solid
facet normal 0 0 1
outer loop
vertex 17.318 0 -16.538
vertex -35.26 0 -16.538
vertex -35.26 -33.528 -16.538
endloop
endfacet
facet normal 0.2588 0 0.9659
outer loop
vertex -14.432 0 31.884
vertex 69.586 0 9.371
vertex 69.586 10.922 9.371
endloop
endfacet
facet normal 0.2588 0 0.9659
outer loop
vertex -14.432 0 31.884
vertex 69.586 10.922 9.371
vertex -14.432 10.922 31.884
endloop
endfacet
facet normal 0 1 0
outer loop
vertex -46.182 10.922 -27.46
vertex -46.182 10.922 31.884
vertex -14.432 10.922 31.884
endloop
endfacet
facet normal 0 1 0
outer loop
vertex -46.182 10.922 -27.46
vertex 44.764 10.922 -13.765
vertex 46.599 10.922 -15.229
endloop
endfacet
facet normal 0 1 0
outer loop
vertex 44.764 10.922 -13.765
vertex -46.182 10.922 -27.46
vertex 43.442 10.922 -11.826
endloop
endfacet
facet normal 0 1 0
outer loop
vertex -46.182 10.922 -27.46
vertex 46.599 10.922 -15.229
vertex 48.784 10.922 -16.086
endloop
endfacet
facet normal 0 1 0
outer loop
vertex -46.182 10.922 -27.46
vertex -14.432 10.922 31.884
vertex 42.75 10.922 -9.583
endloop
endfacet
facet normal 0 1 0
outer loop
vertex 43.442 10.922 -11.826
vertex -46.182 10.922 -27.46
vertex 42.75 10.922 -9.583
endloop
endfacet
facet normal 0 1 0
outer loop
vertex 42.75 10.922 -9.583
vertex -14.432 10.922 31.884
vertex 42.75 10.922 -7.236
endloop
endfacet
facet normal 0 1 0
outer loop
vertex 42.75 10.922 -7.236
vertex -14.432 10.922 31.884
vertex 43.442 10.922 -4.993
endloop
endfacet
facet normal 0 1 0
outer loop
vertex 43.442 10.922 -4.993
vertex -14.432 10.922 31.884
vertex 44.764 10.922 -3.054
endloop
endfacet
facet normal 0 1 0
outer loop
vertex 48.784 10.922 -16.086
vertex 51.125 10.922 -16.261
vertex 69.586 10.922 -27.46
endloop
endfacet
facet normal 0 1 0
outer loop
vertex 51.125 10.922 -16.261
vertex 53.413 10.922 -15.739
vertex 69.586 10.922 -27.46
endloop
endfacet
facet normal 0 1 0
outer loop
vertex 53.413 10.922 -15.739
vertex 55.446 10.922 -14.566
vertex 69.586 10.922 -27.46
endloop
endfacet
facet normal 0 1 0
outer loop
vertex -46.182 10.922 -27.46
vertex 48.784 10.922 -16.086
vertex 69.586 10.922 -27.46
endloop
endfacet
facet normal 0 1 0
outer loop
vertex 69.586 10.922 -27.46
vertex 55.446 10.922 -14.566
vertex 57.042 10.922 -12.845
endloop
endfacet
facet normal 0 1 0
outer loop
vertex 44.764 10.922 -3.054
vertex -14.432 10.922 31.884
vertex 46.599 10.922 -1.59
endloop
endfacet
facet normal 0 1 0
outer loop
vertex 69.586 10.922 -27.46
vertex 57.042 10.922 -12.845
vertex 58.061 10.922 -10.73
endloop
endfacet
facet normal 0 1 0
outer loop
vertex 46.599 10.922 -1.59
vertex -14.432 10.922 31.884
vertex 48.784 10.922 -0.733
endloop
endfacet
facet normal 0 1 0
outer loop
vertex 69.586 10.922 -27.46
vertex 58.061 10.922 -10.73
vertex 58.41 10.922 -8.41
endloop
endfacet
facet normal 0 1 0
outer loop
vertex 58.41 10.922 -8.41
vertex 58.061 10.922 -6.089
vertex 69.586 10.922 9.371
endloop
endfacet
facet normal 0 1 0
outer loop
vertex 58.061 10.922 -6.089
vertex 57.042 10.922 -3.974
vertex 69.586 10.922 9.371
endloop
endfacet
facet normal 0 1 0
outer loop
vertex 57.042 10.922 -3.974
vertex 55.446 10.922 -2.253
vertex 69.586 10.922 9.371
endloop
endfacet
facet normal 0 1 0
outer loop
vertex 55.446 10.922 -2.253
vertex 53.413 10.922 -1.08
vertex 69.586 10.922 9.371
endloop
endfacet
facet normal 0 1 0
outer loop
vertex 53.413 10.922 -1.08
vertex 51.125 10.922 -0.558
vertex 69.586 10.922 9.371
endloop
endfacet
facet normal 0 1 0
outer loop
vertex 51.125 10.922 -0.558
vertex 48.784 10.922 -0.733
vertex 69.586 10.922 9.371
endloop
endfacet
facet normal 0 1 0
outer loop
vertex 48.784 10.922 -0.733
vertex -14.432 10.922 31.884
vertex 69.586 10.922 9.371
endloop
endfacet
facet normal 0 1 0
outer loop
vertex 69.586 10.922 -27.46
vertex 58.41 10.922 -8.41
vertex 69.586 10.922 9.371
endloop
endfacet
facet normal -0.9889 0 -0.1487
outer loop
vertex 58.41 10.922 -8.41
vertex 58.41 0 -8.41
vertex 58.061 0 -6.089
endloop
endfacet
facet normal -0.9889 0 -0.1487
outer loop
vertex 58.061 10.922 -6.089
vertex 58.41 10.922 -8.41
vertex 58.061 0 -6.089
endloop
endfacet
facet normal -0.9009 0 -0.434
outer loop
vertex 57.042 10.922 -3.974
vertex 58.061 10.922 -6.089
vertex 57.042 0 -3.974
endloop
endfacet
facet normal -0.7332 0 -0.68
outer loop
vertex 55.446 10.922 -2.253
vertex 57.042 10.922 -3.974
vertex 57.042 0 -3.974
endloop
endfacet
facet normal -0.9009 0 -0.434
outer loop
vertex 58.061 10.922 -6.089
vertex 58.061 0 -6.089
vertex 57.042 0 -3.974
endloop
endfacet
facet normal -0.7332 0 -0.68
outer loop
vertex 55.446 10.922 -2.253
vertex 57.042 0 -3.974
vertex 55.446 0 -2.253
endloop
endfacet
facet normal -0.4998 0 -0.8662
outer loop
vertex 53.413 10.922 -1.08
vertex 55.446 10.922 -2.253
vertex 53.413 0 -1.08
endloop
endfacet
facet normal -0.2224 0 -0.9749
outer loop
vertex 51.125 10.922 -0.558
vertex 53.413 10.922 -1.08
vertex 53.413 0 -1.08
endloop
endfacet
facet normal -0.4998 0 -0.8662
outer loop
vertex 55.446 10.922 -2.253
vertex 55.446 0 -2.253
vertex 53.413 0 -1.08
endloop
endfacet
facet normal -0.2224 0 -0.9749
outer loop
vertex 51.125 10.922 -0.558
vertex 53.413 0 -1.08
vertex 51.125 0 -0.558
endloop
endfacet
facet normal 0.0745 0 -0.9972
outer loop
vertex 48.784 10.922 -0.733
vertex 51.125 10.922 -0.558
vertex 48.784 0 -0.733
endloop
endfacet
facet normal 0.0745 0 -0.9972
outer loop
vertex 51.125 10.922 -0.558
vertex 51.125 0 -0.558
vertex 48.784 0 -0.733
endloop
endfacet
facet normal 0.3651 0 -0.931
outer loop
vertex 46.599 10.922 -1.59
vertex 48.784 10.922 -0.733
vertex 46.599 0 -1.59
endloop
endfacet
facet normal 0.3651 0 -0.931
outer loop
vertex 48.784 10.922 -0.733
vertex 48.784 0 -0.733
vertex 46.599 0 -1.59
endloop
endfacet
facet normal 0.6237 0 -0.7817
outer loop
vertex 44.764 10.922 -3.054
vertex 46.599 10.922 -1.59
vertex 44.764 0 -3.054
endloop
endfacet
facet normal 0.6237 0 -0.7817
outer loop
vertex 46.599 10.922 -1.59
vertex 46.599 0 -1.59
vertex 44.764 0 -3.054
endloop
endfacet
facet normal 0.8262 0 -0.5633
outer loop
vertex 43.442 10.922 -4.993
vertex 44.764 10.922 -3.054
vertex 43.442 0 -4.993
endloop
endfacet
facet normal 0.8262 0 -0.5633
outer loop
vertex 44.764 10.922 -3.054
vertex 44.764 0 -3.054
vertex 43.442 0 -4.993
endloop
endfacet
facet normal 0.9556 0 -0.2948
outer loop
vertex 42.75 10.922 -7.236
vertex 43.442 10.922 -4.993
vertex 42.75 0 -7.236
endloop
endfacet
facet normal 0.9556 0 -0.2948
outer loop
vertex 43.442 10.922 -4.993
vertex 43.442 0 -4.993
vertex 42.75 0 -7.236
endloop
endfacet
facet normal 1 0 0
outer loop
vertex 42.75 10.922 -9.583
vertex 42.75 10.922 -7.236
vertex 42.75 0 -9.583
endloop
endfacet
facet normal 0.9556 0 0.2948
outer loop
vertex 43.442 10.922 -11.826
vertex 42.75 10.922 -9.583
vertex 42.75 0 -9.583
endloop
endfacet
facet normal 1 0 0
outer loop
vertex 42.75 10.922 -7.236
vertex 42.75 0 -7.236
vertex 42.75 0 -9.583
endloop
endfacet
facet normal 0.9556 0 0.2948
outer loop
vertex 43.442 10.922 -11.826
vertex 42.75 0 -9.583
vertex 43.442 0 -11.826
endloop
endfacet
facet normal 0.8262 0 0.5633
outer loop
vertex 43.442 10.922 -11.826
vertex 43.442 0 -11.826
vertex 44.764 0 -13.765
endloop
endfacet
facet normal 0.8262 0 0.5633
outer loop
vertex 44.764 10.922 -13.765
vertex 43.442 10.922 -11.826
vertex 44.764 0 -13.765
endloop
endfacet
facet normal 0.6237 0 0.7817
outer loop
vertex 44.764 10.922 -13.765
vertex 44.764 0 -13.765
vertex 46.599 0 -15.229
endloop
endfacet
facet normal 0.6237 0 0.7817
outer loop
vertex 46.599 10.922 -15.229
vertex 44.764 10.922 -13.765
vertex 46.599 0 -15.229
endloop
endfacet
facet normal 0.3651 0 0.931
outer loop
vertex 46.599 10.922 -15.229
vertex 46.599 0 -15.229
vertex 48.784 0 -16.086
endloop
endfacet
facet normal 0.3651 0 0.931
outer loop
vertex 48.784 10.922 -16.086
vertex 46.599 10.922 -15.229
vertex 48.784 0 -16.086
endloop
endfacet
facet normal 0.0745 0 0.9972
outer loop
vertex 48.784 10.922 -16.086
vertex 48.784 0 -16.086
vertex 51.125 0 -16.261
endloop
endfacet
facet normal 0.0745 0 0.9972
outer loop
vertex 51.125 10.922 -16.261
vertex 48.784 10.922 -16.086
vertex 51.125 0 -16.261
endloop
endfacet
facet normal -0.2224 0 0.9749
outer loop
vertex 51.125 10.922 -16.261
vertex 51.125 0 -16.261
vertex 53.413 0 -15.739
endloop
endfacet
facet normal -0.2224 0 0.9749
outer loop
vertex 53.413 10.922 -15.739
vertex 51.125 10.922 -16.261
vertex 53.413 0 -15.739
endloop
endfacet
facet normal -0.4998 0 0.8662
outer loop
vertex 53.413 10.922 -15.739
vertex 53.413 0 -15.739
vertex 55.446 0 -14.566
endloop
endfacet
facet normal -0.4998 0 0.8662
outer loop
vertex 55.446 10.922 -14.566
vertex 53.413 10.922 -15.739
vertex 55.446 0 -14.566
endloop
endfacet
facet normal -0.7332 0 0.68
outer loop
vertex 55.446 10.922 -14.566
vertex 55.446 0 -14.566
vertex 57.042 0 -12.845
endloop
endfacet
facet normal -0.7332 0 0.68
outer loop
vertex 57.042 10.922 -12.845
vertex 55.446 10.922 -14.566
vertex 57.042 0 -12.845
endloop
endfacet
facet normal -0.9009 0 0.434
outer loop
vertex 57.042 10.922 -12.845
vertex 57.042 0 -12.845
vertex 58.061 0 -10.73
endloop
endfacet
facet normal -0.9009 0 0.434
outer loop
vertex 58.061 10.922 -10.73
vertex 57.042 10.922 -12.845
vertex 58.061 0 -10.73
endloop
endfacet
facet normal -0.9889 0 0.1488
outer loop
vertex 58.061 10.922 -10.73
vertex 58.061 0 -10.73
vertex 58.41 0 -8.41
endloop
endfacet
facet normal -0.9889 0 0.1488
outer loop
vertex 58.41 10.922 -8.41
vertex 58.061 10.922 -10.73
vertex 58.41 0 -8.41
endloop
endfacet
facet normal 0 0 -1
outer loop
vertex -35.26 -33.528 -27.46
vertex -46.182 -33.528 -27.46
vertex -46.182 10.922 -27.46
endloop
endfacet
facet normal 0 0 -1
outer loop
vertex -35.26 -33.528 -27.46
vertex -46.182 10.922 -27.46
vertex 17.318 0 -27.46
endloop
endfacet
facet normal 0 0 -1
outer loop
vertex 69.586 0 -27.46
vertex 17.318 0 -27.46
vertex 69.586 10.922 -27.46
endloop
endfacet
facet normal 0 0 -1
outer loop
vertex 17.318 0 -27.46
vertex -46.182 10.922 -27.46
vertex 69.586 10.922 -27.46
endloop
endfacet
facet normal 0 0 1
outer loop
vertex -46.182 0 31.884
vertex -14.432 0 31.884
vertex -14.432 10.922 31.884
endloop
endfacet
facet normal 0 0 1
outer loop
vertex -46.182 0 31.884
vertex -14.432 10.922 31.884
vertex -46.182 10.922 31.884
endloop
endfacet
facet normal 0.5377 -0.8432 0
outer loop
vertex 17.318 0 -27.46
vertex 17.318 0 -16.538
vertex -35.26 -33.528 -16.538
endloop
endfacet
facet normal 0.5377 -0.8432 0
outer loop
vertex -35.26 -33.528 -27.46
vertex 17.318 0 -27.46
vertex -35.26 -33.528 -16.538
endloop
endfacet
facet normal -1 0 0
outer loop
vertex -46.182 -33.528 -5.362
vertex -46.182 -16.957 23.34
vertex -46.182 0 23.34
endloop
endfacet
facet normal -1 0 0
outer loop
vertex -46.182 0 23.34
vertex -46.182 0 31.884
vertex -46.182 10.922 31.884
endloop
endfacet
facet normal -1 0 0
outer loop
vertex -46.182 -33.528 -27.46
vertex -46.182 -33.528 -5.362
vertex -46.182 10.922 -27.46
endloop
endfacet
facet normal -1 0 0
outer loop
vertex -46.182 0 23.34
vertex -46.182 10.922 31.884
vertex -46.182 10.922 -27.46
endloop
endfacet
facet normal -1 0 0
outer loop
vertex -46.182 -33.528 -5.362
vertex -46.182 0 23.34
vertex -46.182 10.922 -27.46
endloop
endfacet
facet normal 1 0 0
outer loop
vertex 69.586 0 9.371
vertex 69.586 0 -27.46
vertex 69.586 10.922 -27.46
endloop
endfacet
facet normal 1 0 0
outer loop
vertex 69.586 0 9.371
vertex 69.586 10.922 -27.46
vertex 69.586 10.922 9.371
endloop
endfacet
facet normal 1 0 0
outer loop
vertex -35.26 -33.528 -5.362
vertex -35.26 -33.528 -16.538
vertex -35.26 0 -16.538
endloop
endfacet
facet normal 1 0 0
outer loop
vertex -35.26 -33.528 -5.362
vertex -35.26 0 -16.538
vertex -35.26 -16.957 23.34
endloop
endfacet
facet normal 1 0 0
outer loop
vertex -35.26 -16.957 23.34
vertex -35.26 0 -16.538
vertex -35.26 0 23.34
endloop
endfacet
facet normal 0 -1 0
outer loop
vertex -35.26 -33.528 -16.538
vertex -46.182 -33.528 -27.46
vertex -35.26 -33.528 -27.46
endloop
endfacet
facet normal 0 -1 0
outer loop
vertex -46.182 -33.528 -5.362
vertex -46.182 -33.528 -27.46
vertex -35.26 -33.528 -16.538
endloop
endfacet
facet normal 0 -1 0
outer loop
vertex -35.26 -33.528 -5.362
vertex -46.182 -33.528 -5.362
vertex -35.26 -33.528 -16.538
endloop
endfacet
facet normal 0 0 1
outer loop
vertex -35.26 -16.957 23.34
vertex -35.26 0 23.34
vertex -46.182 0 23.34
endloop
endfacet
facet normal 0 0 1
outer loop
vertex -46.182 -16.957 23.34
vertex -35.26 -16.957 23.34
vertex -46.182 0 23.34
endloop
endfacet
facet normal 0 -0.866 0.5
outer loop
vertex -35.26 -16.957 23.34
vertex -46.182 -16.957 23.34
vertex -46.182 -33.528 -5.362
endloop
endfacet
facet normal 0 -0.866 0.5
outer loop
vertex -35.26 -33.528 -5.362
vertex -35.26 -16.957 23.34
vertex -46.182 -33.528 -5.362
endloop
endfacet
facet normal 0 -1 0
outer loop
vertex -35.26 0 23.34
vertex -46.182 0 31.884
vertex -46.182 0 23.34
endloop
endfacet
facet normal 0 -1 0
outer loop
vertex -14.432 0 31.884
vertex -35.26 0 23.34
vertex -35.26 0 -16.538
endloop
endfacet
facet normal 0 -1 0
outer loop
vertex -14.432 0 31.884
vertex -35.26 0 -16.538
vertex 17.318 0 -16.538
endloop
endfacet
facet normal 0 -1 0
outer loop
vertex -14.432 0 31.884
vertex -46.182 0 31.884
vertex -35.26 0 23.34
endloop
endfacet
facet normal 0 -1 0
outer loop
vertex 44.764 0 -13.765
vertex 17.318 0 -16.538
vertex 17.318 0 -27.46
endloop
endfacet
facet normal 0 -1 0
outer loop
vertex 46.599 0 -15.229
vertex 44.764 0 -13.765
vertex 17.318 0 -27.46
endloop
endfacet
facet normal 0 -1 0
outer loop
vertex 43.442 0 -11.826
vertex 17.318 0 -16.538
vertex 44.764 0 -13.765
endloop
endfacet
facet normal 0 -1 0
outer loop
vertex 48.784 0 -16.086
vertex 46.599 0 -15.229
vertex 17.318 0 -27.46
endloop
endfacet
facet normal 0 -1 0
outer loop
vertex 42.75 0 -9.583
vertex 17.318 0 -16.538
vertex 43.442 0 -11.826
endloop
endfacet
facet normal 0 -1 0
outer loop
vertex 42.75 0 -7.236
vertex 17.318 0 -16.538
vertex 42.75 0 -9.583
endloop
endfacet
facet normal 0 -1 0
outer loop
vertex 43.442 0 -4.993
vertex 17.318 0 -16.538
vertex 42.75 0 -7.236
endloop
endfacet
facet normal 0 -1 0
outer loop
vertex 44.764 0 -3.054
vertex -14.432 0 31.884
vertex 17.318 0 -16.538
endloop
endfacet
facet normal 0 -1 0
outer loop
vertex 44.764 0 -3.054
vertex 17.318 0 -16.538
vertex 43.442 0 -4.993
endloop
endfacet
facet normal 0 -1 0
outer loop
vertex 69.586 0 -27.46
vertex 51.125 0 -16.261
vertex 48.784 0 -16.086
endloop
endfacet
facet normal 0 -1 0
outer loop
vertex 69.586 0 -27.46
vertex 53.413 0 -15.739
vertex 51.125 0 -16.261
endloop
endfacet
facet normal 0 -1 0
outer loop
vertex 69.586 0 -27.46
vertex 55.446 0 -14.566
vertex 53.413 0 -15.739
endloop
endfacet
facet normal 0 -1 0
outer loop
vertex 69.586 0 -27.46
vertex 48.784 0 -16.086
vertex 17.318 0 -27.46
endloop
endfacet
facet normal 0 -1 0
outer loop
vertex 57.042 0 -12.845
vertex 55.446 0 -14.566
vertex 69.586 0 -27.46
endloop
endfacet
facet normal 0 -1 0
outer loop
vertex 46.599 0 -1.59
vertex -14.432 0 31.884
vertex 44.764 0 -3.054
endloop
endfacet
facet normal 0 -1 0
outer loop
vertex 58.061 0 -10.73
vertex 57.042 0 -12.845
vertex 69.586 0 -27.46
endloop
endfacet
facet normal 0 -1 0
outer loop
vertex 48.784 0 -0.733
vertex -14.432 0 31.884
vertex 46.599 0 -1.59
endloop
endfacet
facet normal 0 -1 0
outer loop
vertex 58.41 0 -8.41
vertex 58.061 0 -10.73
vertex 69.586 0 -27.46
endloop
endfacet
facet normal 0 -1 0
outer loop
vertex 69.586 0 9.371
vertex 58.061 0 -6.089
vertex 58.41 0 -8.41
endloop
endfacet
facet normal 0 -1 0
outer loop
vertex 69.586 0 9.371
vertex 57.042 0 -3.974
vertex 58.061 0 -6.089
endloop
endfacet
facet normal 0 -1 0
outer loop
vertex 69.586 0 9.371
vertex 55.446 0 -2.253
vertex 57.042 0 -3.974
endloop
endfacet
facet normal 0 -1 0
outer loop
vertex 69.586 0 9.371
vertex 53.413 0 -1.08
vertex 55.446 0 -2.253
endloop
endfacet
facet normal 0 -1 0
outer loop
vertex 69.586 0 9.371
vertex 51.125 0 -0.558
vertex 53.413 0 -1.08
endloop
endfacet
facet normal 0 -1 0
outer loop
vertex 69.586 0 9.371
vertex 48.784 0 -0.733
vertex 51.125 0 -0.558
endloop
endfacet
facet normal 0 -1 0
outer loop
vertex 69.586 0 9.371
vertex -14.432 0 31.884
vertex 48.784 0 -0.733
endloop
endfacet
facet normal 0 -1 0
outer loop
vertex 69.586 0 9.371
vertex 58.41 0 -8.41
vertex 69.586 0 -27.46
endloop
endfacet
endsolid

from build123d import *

# Parameters (mm, degrees)
F1_DEPTH = 10.922
F2_W     = 52.578
F2_H     = 10.922
F3_DEPTH = 33.528
F5_DEPTH = 10.923
F7_DEPTH = 115.7693519126
F8_R     = 7.874
F9_DEPTH = 10.923


# Not quite as in the source:
# - a feature names something its author has since deleted; it is built from what else it names


with BuildPart() as f1:
    # F0 (on Front) → F1 (new body)
    with BuildSketch(Plane.XZ):
        Polygon((-14.4320207924, 31.8836830556), (-46.1820207924, 31.8836830556), (-46.1820207924, -27.459501562), (-34.950372705, -27.459501562), (69.5863311203, -27.459501562), (69.5863311203, 9.3710335113), align=None)
    extrude(amount=-F1_DEPTH)

    # F2 (on face) → F3 (join)
    with BuildSketch(Plane.XZ):
        with Locations((-8.9710207924, -21.998501562)):
            Rectangle(F2_W, F2_H)
        Polygon((-35.2600207924, 23.340498438), (-46.1820207924, 23.340498438), (-46.1820207924, -27.459501562), (-35.2600207924, -27.459501562), (-35.2600207924, -16.537501562), align=None)
    extrude(amount=F3_DEPTH)

    # F4 (on face) → F5 (cut, through all)
    with BuildSketch(Plane.XY.offset(-16.537501562)):
        Polygon((17.3179792076, -33.528), (17.3179792076, 0), (-35.2600207924, -33.528), align=None)
    extrude(amount=-F5_DEPTH, mode=Mode.SUBTRACT)

    # F6 (on face) → F7 (cut, through all)
    with BuildSketch(Plane(origin=(-46.1820207924, 0, 0), x_dir=(0, -1, 0), z_dir=(-1, 0, 0))):
        Polygon((16.9568925737, 23.340498438), (33.528, -5.361501562), (33.528, 23.340498438), align=None)
    extrude(amount=-F7_DEPTH, mode=Mode.SUBTRACT)

    # F8 (on face) → F9 (cut, through all)
    with BuildSketch(Plane.XZ):
        with Locations((50.5363311203, -8.409501562)):
            Circle(F8_R)
    extrude(amount=-F9_DEPTH, mode=Mode.SUBTRACT)


solid = f1.part
